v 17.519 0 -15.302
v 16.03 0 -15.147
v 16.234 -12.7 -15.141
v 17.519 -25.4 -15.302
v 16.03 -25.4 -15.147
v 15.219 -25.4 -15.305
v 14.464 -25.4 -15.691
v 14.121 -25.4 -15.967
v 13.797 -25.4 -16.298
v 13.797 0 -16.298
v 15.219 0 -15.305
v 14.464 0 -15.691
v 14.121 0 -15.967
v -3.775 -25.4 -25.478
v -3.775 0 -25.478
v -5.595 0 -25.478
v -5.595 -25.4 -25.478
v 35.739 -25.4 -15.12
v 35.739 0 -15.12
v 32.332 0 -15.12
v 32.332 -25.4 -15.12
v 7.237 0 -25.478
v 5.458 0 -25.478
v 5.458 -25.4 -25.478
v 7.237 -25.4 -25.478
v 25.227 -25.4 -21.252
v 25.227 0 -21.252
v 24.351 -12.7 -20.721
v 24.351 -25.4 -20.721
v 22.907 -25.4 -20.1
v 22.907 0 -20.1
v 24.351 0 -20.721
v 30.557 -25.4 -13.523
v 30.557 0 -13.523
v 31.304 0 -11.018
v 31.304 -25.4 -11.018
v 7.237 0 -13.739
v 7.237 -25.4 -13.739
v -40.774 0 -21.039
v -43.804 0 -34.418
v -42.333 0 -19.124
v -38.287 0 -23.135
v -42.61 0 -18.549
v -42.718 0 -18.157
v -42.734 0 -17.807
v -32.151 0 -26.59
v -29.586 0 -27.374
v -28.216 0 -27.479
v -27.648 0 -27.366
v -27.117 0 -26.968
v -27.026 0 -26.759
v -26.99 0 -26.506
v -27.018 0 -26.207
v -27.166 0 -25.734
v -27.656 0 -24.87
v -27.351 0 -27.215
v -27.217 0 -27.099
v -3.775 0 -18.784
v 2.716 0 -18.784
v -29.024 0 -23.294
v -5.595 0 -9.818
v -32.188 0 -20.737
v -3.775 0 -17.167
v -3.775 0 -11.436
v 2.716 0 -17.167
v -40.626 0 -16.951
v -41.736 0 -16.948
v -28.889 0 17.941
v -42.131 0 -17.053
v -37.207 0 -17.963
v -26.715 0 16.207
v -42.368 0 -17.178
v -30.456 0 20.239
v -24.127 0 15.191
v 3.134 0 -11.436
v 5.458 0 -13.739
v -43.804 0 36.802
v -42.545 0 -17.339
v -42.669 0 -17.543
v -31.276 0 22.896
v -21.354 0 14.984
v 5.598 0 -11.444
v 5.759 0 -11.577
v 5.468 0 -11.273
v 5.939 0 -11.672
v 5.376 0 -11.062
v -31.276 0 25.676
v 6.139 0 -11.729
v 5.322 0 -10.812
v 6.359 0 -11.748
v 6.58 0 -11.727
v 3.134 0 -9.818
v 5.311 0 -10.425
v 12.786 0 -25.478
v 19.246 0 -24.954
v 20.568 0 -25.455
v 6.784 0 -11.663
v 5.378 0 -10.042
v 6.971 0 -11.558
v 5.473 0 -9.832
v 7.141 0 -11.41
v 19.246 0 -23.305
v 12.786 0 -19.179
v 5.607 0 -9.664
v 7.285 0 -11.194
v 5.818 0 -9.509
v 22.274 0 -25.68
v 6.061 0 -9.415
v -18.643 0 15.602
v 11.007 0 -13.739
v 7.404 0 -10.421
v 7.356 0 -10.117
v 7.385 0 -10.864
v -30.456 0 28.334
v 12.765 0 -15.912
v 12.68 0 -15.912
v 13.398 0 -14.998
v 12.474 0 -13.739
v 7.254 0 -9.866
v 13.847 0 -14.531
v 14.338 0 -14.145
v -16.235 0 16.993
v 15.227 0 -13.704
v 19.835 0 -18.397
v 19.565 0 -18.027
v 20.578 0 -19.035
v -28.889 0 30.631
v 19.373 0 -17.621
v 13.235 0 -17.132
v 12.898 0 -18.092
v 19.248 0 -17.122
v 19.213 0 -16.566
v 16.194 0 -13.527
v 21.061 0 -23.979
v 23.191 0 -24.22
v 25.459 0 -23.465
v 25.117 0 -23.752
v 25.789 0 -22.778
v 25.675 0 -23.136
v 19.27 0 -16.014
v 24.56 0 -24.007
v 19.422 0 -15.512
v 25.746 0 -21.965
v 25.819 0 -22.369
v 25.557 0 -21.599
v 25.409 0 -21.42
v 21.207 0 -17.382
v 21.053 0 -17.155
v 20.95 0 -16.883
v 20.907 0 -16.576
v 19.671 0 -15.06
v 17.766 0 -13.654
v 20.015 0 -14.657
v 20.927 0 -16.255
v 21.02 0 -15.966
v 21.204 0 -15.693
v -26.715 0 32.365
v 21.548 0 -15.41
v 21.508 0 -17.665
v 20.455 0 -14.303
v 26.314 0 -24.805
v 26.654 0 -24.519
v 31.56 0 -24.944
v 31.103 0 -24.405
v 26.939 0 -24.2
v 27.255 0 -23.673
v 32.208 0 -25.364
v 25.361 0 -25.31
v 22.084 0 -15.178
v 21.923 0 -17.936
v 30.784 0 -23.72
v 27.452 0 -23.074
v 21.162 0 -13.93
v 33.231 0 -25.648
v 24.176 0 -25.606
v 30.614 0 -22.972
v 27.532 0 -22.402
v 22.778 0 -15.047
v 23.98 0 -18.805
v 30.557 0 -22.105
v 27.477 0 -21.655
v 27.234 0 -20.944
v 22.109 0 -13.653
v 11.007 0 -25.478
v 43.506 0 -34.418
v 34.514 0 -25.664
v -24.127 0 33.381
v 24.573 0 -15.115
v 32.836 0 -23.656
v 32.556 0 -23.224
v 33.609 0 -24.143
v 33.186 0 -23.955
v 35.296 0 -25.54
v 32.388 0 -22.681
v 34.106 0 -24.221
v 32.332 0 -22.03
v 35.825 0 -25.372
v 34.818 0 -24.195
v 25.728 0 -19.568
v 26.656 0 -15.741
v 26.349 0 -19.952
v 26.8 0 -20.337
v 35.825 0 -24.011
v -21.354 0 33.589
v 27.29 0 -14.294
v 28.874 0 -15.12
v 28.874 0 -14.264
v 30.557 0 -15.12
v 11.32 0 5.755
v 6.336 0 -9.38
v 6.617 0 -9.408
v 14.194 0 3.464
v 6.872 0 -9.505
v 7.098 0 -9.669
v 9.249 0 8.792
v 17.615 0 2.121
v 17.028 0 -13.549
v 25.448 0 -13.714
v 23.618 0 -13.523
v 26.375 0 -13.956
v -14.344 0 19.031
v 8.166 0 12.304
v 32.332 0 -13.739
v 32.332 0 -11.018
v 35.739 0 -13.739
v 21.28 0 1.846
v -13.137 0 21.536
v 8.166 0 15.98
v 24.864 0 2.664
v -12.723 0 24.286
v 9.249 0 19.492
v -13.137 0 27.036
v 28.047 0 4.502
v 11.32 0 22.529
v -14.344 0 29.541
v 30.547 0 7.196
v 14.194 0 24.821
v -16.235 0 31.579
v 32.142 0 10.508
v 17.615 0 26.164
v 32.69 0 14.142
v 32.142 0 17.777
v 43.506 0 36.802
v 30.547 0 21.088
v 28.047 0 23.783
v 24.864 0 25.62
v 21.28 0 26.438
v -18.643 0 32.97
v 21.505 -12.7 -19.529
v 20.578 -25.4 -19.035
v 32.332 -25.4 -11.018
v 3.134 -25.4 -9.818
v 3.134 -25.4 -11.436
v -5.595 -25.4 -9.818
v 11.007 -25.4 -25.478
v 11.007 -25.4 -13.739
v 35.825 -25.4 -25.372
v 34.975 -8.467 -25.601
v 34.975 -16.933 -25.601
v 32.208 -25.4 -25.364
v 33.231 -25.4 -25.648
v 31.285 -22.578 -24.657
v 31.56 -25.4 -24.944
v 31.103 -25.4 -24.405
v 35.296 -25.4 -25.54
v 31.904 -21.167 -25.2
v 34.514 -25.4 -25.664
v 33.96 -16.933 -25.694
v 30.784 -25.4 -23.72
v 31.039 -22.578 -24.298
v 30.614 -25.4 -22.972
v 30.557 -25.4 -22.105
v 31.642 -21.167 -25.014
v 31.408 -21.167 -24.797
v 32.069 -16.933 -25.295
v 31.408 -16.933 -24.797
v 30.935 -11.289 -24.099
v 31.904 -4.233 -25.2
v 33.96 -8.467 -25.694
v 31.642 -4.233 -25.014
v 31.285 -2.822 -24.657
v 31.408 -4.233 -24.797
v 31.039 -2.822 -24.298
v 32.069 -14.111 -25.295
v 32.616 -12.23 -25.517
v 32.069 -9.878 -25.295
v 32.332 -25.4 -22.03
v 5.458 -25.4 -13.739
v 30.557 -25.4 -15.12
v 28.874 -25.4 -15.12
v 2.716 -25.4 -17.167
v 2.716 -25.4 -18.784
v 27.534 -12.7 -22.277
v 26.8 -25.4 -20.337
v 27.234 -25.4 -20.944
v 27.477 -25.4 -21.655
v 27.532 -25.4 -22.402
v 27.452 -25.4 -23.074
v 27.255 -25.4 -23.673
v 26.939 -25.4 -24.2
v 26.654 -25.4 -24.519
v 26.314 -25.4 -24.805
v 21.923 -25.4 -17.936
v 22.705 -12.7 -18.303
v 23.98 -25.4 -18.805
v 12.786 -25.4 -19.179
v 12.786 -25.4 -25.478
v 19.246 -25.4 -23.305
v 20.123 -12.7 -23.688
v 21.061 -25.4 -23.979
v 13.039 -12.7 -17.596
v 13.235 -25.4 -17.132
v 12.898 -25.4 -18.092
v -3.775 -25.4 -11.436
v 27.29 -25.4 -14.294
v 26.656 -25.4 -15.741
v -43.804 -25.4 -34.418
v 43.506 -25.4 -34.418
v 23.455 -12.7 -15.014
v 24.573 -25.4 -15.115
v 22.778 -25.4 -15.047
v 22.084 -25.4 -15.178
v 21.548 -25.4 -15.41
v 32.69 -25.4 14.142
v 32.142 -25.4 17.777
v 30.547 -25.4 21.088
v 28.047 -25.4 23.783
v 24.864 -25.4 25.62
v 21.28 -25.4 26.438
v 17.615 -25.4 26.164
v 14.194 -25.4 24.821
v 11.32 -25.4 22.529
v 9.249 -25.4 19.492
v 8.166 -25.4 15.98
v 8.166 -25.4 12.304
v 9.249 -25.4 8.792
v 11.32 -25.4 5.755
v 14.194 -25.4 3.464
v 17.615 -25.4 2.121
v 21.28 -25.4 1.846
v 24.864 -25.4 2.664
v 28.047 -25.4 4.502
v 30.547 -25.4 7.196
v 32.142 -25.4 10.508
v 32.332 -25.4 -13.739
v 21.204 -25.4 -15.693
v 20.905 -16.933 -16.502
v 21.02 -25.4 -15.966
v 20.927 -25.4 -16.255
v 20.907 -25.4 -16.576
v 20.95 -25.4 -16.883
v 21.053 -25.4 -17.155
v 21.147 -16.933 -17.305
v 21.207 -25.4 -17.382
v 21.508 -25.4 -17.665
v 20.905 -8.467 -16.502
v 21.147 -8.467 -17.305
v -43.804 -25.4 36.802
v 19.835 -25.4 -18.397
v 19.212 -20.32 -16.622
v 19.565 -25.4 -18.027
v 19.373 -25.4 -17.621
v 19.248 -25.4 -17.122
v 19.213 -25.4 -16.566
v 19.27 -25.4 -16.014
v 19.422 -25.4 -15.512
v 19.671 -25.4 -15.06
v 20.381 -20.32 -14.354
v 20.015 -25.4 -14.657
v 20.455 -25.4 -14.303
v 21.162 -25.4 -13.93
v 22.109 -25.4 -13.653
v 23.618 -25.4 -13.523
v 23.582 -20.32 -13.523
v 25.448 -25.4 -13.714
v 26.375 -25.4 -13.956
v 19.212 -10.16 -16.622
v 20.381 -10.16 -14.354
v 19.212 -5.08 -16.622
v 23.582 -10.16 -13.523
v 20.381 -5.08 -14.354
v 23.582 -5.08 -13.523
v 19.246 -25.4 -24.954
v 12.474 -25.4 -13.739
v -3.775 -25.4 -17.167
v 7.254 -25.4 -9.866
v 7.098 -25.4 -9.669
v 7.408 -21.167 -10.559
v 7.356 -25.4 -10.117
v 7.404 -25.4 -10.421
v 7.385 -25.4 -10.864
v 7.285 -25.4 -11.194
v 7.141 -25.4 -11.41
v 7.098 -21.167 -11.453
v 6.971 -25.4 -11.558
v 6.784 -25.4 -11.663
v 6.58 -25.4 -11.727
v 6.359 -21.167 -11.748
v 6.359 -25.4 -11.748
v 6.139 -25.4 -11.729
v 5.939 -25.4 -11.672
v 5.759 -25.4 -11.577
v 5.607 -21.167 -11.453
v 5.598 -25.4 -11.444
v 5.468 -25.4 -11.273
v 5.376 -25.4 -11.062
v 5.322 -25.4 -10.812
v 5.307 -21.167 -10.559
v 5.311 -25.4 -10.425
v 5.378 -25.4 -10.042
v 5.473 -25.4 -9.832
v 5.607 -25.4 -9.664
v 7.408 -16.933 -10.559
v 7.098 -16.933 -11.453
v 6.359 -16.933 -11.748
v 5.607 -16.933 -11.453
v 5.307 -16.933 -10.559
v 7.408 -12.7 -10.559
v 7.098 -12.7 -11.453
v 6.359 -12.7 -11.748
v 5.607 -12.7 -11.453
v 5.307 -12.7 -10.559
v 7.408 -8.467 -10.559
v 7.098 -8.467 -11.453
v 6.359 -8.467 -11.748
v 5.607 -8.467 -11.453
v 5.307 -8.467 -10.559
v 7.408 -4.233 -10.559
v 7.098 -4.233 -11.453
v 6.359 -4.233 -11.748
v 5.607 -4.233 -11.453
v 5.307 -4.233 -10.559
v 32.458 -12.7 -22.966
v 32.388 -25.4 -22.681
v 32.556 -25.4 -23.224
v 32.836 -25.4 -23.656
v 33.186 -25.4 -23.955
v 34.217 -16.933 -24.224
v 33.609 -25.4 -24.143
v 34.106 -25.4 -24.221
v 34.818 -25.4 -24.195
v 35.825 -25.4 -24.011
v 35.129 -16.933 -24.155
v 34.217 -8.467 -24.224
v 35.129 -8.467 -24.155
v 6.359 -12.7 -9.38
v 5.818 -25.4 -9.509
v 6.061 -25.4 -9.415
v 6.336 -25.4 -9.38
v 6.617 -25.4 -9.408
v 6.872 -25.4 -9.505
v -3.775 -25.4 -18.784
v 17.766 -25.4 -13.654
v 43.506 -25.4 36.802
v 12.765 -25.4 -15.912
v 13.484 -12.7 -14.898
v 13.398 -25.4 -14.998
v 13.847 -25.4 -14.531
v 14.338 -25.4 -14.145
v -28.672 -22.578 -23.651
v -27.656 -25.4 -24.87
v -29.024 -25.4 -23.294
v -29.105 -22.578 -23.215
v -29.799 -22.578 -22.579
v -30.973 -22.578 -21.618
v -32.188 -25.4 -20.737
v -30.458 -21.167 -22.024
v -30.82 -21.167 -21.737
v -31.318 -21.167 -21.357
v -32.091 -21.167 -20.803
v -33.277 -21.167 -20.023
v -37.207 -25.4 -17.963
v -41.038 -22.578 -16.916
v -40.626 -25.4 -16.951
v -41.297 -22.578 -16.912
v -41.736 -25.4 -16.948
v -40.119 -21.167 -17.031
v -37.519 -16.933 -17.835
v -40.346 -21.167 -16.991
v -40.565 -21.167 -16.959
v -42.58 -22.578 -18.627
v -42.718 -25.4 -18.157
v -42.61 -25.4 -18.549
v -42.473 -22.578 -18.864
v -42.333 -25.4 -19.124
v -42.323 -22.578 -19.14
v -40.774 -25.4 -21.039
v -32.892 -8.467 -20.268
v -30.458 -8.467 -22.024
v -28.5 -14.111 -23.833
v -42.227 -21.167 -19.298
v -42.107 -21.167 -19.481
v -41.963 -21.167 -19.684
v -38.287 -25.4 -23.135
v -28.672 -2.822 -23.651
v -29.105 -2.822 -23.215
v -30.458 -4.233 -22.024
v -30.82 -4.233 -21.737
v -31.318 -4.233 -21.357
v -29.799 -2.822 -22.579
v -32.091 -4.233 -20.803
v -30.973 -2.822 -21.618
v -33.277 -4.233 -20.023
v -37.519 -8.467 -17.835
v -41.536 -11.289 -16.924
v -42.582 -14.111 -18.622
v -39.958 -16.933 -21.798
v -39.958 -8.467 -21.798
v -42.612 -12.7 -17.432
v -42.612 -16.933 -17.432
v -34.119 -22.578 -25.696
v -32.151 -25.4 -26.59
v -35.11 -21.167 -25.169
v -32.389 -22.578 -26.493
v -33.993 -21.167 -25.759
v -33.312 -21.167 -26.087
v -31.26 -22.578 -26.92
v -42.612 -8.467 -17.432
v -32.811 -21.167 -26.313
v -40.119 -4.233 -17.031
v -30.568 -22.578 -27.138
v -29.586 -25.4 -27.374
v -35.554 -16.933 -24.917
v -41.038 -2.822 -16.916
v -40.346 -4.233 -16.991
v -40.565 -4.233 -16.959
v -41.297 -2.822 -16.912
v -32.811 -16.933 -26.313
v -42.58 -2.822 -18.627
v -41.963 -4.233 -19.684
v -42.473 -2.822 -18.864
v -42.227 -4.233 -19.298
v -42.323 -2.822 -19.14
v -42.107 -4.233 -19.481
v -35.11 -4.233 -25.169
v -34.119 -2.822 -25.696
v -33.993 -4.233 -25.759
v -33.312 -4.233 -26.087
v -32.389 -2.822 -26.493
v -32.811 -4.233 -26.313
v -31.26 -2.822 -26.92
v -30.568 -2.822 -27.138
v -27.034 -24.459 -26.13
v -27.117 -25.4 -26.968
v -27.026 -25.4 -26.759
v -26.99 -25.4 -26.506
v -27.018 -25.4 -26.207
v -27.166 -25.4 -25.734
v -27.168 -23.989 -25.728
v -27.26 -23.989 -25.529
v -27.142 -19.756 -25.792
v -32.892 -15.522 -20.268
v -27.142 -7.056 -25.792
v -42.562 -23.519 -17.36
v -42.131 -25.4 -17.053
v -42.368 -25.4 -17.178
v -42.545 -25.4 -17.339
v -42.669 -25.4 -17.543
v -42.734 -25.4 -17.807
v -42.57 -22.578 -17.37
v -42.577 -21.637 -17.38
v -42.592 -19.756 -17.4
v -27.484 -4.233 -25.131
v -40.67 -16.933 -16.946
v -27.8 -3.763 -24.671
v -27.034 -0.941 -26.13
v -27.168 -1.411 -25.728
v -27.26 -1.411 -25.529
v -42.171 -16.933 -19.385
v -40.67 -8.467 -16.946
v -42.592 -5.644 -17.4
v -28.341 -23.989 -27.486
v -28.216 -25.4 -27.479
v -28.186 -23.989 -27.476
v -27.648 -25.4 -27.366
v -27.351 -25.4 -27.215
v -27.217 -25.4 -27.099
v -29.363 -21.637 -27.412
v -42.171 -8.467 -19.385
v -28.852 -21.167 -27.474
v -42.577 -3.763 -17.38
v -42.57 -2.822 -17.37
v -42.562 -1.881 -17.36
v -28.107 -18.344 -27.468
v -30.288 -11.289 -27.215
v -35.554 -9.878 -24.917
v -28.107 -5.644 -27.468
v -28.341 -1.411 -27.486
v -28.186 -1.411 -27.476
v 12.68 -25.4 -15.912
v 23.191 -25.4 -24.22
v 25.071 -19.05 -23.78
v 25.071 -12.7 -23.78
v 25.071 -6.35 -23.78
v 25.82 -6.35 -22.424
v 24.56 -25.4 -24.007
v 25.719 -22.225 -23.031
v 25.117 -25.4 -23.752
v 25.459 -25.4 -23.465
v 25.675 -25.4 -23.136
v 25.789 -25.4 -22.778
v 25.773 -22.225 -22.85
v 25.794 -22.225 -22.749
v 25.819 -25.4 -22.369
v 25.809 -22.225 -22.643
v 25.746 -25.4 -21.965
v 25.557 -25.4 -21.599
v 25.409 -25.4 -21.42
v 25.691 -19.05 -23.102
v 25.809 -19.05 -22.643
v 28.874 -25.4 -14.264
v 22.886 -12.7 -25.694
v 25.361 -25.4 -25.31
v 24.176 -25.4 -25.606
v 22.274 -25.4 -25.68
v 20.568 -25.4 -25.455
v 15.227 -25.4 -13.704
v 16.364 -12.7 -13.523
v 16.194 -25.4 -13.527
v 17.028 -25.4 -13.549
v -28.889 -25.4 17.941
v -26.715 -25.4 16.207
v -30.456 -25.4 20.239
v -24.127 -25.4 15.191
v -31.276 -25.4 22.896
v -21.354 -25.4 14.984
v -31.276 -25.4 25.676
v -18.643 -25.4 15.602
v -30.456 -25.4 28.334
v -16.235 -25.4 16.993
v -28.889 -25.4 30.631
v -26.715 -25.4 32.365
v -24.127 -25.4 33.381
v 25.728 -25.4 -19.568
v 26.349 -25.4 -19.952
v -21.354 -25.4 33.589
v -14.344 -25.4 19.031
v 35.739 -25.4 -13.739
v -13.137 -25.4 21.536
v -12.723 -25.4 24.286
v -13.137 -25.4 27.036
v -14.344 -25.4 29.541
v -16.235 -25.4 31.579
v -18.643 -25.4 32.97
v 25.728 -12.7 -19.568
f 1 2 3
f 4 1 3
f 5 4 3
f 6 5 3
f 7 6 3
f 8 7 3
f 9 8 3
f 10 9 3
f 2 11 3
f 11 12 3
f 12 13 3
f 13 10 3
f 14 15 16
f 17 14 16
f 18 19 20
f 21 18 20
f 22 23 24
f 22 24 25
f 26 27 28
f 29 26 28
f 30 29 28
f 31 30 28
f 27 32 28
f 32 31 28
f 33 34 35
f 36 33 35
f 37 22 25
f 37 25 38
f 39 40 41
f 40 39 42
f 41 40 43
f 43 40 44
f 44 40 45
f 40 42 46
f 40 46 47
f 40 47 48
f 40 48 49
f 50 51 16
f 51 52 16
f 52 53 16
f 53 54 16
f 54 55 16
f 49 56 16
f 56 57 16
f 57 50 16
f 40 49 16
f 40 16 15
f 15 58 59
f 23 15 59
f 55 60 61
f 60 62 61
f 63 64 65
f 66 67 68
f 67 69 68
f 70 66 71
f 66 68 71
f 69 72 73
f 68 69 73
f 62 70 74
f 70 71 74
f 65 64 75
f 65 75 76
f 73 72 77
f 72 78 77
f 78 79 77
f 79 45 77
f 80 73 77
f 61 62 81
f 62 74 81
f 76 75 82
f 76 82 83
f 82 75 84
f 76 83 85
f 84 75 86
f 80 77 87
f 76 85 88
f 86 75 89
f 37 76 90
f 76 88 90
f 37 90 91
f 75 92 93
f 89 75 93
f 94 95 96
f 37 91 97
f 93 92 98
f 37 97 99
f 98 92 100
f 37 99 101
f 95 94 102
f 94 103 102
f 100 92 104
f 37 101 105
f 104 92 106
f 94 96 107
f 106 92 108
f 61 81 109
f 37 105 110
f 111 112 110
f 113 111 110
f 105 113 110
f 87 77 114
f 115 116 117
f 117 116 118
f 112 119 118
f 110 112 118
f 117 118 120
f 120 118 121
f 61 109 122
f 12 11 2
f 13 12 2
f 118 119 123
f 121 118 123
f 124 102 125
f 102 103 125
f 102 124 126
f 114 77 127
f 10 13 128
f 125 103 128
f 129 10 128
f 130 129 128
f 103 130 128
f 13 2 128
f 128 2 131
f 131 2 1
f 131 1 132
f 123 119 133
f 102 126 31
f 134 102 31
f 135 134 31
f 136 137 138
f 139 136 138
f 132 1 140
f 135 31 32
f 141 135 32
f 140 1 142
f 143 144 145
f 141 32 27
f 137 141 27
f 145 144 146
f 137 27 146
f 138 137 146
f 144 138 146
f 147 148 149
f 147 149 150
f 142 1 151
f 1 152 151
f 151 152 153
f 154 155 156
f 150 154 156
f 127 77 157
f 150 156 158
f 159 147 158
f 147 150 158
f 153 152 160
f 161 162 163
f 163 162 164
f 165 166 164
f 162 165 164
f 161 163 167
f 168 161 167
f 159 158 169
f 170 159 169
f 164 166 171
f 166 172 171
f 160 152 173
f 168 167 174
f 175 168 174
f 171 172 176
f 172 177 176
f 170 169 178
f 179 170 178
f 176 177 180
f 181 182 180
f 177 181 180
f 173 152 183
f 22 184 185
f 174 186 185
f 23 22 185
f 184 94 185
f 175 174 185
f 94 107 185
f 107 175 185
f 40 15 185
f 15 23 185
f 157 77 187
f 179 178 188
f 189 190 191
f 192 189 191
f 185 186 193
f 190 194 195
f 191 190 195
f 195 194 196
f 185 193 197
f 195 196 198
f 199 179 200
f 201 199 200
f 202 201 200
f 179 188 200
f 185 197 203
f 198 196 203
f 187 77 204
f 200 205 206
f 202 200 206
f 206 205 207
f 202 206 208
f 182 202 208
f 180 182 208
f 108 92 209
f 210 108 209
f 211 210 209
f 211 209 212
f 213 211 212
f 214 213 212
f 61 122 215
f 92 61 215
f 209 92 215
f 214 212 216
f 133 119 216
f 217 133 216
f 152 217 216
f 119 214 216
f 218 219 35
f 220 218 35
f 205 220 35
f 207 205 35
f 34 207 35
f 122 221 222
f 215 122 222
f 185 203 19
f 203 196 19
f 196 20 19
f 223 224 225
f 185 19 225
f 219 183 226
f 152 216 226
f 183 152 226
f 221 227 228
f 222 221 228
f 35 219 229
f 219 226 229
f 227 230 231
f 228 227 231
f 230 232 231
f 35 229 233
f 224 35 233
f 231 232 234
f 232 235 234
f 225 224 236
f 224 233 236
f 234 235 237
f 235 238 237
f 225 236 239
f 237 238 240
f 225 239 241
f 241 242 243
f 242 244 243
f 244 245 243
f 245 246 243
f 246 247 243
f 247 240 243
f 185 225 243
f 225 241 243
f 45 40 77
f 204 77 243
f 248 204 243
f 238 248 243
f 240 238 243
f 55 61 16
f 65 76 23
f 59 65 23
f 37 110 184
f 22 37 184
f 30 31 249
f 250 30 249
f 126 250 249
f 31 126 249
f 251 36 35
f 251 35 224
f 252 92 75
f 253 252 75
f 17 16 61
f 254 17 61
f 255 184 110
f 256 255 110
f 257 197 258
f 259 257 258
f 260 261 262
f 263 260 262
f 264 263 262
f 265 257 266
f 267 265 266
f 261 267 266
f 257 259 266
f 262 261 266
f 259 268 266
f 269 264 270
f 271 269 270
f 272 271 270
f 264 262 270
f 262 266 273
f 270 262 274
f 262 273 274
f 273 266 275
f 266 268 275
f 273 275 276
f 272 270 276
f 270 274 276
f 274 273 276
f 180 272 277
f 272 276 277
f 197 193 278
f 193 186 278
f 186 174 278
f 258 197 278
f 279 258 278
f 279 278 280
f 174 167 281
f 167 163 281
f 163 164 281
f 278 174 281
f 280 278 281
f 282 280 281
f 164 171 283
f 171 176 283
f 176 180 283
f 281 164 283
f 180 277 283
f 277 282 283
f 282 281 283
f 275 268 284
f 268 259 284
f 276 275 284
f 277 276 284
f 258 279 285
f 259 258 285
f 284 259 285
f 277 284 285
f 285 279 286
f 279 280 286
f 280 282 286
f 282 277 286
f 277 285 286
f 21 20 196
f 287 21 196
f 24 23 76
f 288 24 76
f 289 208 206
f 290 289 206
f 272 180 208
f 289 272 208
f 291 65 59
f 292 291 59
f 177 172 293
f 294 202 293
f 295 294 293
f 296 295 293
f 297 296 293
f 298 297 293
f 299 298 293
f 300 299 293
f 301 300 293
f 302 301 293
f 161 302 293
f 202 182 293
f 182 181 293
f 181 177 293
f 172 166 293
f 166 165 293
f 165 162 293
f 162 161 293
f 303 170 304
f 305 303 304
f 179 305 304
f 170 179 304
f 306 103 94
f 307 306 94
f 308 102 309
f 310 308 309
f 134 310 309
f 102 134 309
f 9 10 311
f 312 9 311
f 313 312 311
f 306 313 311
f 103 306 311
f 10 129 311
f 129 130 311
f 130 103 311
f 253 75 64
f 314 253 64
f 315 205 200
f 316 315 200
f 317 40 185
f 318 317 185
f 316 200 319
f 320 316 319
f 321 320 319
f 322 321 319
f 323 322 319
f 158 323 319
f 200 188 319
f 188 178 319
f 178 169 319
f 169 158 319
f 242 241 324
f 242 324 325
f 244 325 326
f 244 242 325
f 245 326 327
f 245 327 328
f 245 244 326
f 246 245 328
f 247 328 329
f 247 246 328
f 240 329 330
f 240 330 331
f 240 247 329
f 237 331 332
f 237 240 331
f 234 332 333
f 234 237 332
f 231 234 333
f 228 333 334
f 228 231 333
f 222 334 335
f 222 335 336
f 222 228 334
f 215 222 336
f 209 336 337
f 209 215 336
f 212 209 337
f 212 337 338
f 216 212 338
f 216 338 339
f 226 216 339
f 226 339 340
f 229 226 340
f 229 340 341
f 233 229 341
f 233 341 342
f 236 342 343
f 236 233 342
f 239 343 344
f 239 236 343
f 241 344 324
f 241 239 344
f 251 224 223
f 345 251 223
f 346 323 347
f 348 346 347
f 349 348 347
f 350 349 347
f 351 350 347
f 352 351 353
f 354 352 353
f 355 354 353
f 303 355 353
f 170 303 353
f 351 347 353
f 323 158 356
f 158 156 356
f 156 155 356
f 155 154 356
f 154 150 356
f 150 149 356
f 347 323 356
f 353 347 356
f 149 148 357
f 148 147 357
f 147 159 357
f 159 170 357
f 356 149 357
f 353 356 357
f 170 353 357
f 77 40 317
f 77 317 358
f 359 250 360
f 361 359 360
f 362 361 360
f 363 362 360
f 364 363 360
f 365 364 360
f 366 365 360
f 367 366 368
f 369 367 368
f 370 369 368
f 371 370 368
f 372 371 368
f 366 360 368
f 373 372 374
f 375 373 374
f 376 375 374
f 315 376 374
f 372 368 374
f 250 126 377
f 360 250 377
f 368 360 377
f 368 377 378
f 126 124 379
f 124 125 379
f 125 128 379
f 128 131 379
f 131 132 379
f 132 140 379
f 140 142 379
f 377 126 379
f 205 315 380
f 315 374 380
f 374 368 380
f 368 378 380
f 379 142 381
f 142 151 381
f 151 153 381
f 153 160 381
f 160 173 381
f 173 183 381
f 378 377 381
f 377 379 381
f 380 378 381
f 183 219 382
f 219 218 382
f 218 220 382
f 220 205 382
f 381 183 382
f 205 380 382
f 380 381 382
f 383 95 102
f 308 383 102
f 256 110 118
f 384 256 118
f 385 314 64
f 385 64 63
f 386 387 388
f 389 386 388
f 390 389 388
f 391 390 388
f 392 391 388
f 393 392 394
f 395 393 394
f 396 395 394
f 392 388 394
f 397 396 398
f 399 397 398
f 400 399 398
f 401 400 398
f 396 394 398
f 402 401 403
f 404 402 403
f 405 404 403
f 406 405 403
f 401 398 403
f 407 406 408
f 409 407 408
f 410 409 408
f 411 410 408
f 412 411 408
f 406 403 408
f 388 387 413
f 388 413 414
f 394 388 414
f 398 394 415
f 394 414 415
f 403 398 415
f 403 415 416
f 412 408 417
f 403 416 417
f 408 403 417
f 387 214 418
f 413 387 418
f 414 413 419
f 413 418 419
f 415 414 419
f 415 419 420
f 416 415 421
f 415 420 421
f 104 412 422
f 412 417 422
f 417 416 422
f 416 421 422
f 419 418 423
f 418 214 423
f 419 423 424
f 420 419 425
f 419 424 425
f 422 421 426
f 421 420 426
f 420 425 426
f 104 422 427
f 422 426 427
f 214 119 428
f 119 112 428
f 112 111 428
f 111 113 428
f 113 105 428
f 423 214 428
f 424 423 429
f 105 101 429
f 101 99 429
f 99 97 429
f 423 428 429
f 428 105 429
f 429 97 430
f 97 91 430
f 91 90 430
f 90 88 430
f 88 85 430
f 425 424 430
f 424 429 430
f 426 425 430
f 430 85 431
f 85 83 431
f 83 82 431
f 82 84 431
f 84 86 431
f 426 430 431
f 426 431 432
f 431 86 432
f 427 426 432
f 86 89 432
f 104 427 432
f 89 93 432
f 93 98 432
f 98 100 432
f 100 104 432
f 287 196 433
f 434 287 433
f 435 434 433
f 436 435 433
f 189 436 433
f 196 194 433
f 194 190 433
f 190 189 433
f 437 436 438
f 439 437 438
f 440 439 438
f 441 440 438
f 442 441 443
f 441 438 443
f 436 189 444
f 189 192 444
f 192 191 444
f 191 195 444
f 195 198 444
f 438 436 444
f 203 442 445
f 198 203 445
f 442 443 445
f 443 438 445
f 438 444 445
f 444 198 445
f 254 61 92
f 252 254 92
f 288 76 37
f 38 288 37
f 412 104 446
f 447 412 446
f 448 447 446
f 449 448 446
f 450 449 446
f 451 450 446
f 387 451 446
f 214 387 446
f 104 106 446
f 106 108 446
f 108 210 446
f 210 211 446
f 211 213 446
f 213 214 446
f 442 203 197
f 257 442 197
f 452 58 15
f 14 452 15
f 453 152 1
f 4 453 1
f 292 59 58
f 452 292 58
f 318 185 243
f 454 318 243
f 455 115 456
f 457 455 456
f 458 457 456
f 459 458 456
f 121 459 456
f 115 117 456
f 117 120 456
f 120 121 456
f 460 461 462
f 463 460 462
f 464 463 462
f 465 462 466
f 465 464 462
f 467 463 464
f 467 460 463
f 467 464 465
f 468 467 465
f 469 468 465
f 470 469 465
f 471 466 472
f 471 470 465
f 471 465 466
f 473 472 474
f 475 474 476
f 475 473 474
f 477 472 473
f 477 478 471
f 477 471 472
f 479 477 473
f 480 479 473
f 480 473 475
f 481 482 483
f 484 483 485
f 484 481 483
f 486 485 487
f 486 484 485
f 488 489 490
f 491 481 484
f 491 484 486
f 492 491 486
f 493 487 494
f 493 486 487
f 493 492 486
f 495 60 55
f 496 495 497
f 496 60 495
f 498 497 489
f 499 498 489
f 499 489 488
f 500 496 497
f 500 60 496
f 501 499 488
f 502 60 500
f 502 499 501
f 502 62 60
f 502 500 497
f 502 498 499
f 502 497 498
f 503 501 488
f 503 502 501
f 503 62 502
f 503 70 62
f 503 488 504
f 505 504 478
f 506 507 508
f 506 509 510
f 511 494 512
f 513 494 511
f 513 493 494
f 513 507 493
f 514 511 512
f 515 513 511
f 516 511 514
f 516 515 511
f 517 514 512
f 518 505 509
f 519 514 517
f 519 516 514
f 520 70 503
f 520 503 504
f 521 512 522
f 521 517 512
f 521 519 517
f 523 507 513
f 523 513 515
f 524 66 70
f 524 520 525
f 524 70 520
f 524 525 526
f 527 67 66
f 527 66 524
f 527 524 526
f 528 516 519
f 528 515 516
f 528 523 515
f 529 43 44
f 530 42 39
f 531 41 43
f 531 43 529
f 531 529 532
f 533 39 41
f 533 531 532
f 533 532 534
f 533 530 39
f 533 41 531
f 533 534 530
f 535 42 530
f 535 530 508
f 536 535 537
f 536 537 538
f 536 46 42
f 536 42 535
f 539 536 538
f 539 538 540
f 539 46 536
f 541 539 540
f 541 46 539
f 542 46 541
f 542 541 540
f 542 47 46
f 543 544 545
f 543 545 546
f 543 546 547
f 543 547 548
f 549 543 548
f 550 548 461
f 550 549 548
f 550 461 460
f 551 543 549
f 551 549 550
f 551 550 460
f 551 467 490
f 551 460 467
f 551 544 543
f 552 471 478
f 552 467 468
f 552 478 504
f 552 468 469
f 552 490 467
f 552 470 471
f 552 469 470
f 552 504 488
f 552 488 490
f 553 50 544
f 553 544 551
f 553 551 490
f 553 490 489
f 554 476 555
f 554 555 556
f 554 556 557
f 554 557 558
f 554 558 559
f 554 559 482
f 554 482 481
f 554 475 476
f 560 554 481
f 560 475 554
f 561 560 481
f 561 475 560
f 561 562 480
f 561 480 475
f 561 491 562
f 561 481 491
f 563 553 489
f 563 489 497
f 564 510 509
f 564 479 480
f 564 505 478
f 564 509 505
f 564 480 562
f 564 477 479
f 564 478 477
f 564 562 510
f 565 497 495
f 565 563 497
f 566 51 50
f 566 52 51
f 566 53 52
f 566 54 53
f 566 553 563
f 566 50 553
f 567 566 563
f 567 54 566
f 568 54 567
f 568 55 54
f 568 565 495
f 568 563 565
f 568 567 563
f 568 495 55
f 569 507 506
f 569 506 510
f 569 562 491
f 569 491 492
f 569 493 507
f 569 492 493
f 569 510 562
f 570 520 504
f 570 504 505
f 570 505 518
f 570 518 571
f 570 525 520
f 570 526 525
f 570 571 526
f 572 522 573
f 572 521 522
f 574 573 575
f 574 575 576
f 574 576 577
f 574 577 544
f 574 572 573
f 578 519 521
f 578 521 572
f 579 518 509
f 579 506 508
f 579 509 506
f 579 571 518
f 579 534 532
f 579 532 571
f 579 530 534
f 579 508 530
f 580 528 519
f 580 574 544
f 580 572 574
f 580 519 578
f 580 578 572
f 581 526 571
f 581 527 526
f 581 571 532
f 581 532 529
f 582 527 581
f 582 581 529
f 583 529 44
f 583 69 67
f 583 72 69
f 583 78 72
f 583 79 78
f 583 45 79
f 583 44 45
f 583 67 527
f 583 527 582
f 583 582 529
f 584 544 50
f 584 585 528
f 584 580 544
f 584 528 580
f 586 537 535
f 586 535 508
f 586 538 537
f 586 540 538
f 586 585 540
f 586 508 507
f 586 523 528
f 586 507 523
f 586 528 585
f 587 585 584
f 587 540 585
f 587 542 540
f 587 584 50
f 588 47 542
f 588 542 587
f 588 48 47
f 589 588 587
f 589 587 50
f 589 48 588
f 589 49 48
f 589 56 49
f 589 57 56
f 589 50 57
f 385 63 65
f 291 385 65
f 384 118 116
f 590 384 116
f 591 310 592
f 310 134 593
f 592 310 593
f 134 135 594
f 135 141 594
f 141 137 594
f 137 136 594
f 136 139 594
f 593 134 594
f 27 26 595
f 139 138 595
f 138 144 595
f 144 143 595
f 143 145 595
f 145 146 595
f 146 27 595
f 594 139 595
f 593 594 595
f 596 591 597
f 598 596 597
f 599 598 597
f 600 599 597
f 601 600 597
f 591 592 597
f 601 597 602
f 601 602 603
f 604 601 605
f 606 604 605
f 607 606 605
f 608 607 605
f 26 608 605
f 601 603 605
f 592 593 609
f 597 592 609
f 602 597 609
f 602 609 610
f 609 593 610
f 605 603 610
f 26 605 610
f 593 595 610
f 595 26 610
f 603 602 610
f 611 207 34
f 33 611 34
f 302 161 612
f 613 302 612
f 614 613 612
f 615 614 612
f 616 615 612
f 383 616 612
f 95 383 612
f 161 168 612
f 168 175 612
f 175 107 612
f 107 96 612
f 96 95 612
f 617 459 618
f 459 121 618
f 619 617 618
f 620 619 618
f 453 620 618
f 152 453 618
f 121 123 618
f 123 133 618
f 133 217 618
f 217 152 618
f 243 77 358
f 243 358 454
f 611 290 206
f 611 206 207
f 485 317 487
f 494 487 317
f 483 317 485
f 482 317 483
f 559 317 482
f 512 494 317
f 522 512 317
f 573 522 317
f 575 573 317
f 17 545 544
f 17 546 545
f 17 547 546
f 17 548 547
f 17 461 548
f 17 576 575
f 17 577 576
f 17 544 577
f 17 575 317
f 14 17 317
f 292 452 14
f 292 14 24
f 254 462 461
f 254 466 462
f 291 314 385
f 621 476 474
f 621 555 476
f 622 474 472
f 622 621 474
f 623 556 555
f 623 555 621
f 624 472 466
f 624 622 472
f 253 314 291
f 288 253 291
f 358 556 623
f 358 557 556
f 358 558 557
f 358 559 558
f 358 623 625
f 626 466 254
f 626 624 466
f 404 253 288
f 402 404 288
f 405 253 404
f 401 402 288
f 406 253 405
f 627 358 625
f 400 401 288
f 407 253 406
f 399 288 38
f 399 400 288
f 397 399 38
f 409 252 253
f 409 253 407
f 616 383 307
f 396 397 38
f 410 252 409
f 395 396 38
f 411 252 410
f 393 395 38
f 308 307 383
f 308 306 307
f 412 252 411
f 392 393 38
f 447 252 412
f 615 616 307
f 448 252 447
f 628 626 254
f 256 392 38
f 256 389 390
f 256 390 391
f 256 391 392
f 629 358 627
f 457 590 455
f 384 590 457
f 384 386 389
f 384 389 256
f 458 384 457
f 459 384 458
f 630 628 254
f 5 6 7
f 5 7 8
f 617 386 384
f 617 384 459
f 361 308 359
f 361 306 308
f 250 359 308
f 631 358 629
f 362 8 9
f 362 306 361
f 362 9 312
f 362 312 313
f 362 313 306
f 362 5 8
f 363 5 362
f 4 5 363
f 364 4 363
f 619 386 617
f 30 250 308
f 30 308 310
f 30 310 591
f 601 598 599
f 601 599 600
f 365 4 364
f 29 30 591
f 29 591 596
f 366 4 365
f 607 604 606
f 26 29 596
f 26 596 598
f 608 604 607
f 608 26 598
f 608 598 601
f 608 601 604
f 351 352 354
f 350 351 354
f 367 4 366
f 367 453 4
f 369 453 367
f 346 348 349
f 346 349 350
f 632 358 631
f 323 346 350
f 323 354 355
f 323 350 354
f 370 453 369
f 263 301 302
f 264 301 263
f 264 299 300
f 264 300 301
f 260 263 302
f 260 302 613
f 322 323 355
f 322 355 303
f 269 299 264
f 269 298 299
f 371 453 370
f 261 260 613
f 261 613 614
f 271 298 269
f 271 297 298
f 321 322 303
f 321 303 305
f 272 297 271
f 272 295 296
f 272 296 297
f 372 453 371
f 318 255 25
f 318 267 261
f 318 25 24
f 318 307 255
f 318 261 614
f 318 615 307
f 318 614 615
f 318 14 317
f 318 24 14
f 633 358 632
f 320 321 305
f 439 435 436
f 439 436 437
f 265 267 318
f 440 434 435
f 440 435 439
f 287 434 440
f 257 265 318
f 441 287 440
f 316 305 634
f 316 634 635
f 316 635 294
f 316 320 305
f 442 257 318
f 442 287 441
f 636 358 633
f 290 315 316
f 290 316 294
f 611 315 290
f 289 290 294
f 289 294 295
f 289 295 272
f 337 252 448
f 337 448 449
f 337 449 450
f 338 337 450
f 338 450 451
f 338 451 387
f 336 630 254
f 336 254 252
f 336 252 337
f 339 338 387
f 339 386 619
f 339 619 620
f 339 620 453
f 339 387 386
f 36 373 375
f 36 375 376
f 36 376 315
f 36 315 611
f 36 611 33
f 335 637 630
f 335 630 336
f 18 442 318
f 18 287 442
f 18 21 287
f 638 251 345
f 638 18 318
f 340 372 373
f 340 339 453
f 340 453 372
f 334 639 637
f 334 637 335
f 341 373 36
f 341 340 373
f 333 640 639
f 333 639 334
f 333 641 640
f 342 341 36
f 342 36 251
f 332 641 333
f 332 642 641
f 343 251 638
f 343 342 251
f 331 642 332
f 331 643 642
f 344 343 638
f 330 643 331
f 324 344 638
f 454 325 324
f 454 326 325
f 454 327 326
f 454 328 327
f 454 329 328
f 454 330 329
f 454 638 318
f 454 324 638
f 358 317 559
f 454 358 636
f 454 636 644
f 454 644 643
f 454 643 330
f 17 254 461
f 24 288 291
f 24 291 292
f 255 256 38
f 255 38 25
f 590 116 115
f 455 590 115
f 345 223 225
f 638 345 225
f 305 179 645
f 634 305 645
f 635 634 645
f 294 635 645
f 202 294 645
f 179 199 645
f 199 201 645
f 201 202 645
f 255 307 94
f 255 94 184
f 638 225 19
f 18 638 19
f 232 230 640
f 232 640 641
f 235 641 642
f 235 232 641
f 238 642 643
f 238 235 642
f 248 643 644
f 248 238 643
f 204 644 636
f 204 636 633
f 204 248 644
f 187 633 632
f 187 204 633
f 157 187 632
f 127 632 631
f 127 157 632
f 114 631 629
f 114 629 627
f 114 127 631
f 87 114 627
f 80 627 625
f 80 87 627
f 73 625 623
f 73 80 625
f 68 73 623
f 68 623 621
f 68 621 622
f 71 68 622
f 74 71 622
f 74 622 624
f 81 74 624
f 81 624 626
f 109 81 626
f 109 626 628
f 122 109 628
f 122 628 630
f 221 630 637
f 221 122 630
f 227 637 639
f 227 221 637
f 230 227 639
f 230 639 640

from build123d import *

# Parameters (mm, degrees)
F0_W     = 87.3107276857
F0_H     = 71.2193287909
F0_W_2   = 1.7788149683
F0_H_2   = 11.7388078353
F0_R     = 9.3285263882
F0_R_2   = 12.3305687845
F1_DEPTH = 25.4


with BuildPart() as f1:
    # F0 (on Front) → F1 (new body)
    with BuildSketch(Plane.XZ):
        with Locations((-0.1489948481, 1.1919569224)):
            Rectangle(F0_W, F0_H)
        with BuildLine():
            add(Edge.make_bspline(
                [(-27.116984129, -26.9679892808), (-24.67801378, -23.0046630593), (-37.5190635812, -17.8345930175), (-50.3601133823, -12.6645229757), (-39.9580339301, -21.797919239), (-29.5559544779, -30.9313155023), (-27.116984129, -26.9679892808)],
                knots=[0, 0, 0, 2.0943951024, 2.0943951024, 4.1887902048, 4.1887902048, 6.2831853072, 6.2831853072, 6.2831853072], degree=2, weights=[1, 0.5, 1, 0.5, 1, 0.5, 1]))
        make_face(mode=Mode.SUBTRACT)
        Polygon((-3.7753647961, -18.7843553795), (-3.7753647961, -25.4780463874), (-5.5953084342, -25.4780463874), (-5.5953084342, -9.8183053657), (3.1342517282, -9.8183053657), (3.1342517282, -11.436033044), (-3.7753647961, -11.436033044), (-3.7753647961, -17.1666277011), (2.716110252, -17.1666277011), (2.716110252, -18.7843553795), align=None, mode=Mode.SUBTRACT)
        with Locations((6.3474290554, -19.6086424698)):
            Rectangle(F0_W_2, F0_H_2, mode=Mode.SUBTRACT)
        with BuildLine():
            add(Edge.make_bspline(
                [(14.3383868563, -14.1453841663), (15.2603545373, -13.5233130358), (16.3639738433, -13.5233130358)],
                knots=[0, 0, 0, 1, 1, 1], degree=2))
            add(Edge.make_bspline(
                [(16.3639738433, -13.5233130358), (17.1454185693, -13.5233130358), (17.7657760052, -13.6535538234)],
                knots=[0, 0, 0, 1, 1, 1], degree=2))
            Line((17.7657760052, -13.6535538234), (17.5190039865, -15.3021280041))
            add(Edge.make_bspline(
                [(17.5190039865, -15.3021280041), (16.7923974869, -15.1410407141), (16.2337330556, -15.1410407141)],
                knots=[0, 0, 0, 1, 1, 1], degree=2))
            add(Edge.make_bspline(
                [(16.2337330556, -15.1410407141), (14.8079391697, -15.1410407141), (13.7968593707, -16.2977845519)],
                knots=[0, 0, 0, 1, 1, 1], degree=2))
            add(Edge.make_bspline(
                [(13.7968593707, -16.2977845519), (12.7857795718, -17.4545283897), (12.7857795718, -19.1785051316)],
                knots=[0, 0, 0, 1, 1, 1], degree=2))
            Line((12.7857795718, -19.1785051316), (12.7857795718, -25.4780463874))
            Line((12.7857795718, -25.4780463874), (11.0069646034, -25.4780463874))
            Line((11.0069646034, -25.4780463874), (11.0069646034, -13.7392385522))
            Line((11.0069646034, -13.7392385522), (12.4738871592, -13.7392385522))
            Line((12.4738871592, -13.7392385522), (12.6795305081, -15.9122032726))
            Line((12.6795305081, -15.9122032726), (12.7652152369, -15.9122032726))
            add(Edge.make_bspline(
                [(12.7652152369, -15.9122032726), (13.4164191752, -14.7674552969), (14.3383868563, -14.1453841663)],
                knots=[0, 0, 0, 1, 1, 1], degree=2))
        make_face(mode=Mode.SUBTRACT)
        with BuildLine():
            add(Edge.make_bspline(
                [(26.800373802, -20.336962664), (27.5338350798, -21.1081252225), (27.5338350798, -22.2768649223)],
                knots=[0, 0, 0, 1, 1, 1], degree=2))
            add(Edge.make_bspline(
                [(27.5338350798, -22.2768649223), (27.5338350798, -23.9151569355), (26.3136845428, -24.8045644197)],
                knots=[0, 0, 0, 1, 1, 1], degree=2))
            add(Edge.make_bspline(
                [(26.3136845428, -24.8045644197), (25.0935340058, -25.6939719038), (22.8862953938, -25.6939719038)],
                knots=[0, 0, 0, 1, 1, 1], degree=2))
            add(Edge.make_bspline(
                [(22.8862953938, -25.6939719038), (20.5522433834, -25.6939719038), (19.2464081176, -24.9536558476)],
                knots=[0, 0, 0, 1, 1, 1], degree=2))
            Line((19.2464081176, -24.9536558476), (19.2464081176, -23.305081667))
            add(Edge.make_bspline(
                [(19.2464081176, -23.305081667), (20.0929732374, -23.7335053106), (21.061210672, -23.9785636348)],
                knots=[0, 0, 0, 1, 1, 1], degree=2))
            add(Edge.make_bspline(
                [(21.061210672, -23.9785636348), (22.0294481066, -24.2236219589), (22.9308514528, -24.2236219589)],
                knots=[0, 0, 0, 1, 1, 1], degree=2))
            add(Edge.make_bspline(
                [(22.9308514528, -24.2236219589), (24.3223714472, -24.2236219589), (25.0712559763, -23.7797750641)],
                knots=[0, 0, 0, 1, 1, 1], degree=2))
            add(Edge.make_bspline(
                [(25.0712559763, -23.7797750641), (25.8201405054, -23.3359281693), (25.8201405054, -22.4242426557)],
                knots=[0, 0, 0, 1, 1, 1], degree=2))
            add(Edge.make_bspline(
                [(25.8201405054, -22.4242426557), (25.8201405054, -21.7387648259), (25.2272021826, -21.2520755667)],
                knots=[0, 0, 0, 1, 1, 1], degree=2))
            add(Edge.make_bspline(
                [(25.2272021826, -21.2520755667), (24.6342638598, -20.7653863076), (22.9068597287, -20.1004728127)],
                knots=[0, 0, 0, 1, 1, 1], degree=2))
            add(Edge.make_bspline(
                [(22.9068597287, -20.1004728127), (21.2685677155, -19.4903975442), (20.577948802, -19.0345547873)],
                knots=[0, 0, 0, 1, 1, 1], degree=2))
            add(Edge.make_bspline(
                [(20.577948802, -19.0345547873), (19.8873298885, -18.5787120305), (19.5497320573, -18.0011969589)],
                knots=[0, 0, 0, 1, 1, 1], degree=2))
            add(Edge.make_bspline(
                [(19.5497320573, -18.0011969589), (19.2121342261, -17.4236818873), (19.2121342261, -16.6216728265)],
                knots=[0, 0, 0, 1, 1, 1], degree=2))
            add(Edge.make_bspline(
                [(19.2121342261, -16.6216728265), (19.2121342261, -15.185596773), (20.3808739259, -14.3544549044)],
                knots=[0, 0, 0, 1, 1, 1], degree=2))
            add(Edge.make_bspline(
                [(20.3808739259, -14.3544549044), (21.5496136257, -13.5233130358), (23.5820553911, -13.5233130358)],
                knots=[0, 0, 0, 1, 1, 1], degree=2))
            add(Edge.make_bspline(
                [(23.5820553911, -13.5233130358), (25.4774015905, -13.5233130358), (27.2904904503, -14.2944755943)],
                knots=[0, 0, 0, 1, 1, 1], degree=2))
            Line((27.2904904503, -14.2944755943), (26.6564234577, -15.7408338152))
            add(Edge.make_bspline(
                [(26.6564234577, -15.7408338152), (24.891318046, -15.0142273156), (23.4552419926, -15.0142273156)],
                knots=[0, 0, 0, 1, 1, 1], degree=2))
            add(Edge.make_bspline(
                [(23.4552419926, -15.0142273156), (22.1905353966, -15.0142273156), (21.5478999311, -15.4100907623)],
                knots=[0, 0, 0, 1, 1, 1], degree=2))
            add(Edge.make_bspline(
                [(21.5478999311, -15.4100907623), (20.9052644657, -15.805954209), (20.9052644657, -16.5017142062)],
                knots=[0, 0, 0, 1, 1, 1], degree=2))
            add(Edge.make_bspline(
                [(20.9052644657, -16.5017142062), (20.9052644657, -16.9746939088), (21.1468954007, -17.3054369617)],
                knots=[0, 0, 0, 1, 1, 1], degree=2))
            add(Edge.make_bspline(
                [(21.1468954007, -17.3054369617), (21.3885263357, -17.6361800146), (21.923199043, -17.9360765651)],
                knots=[0, 0, 0, 1, 1, 1], degree=2))
            add(Edge.make_bspline(
                [(21.923199043, -17.9360765651), (22.4578717502, -18.2359731156), (23.9796325323, -18.8049197144)],
                knots=[0, 0, 0, 1, 1, 1], degree=2))
            add(Edge.make_bspline(
                [(23.9796325323, -18.8049197144), (26.0669125241, -19.5658001054), (26.800373802, -20.336962664)],
                knots=[0, 0, 0, 1, 1, 1], degree=2))
        make_face(mode=Mode.SUBTRACT)
        with BuildLine():
            add(Edge.make_bspline(
                [(32.8360060933, -23.6563890547), (33.3398322982, -24.2236219589), (34.2172439204, -24.2236219589)],
                knots=[0, 0, 0, 1, 1, 1], degree=2))
            add(Edge.make_bspline(
                [(34.2172439204, -24.2236219589), (34.6902236229, -24.2236219589), (35.128929434, -24.1550741759)],
                knots=[0, 0, 0, 1, 1, 1], degree=2))
            add(Edge.make_bspline(
                [(35.128929434, -24.1550741759), (35.5676352451, -24.0865263929), (35.8246894312, -24.0111238317)],
                knots=[0, 0, 0, 1, 1, 1], degree=2))
            Line((35.8246894312, -24.0111238317), (35.8246894312, -25.3717973238))
            add(Edge.make_bspline(
                [(35.8246894312, -25.3717973238), (35.5367887427, -25.5088928898), (34.9746969223, -25.6014323968)],
                knots=[0, 0, 0, 1, 1, 1], degree=2))
            add(Edge.make_bspline(
                [(34.9746969223, -25.6014323968), (34.4126051019, -25.6939719038), (33.9601897342, -25.6939719038)],
                knots=[0, 0, 0, 1, 1, 1], degree=2))
            add(Edge.make_bspline(
                [(33.9601897342, -25.6939719038), (30.5567923092, -25.6939719038), (30.5567923092, -22.1054954648)],
                knots=[0, 0, 0, 1, 1, 1], degree=2))
            Line((30.5567923092, -22.1054954648), (30.5567923092, -15.1204763792))
            Line((30.5567923092, -15.1204763792), (28.8739442371, -15.1204763792))
            Line((28.8739442371, -15.1204763792), (28.8739442371, -14.263629092))
            Line((28.8739442371, -14.263629092), (30.5567923092, -13.5233130358))
            Line((30.5567923092, -13.5233130358), (31.3039631437, -11.0178915679))
            Line((31.3039631437, -11.0178915679), (32.3321798884, -11.0178915679))
            Line((32.3321798884, -11.0178915679), (32.3321798884, -13.7392385522))
            Line((32.3321798884, -13.7392385522), (35.7390047025, -13.7392385522))
            Line((35.7390047025, -13.7392385522), (35.7390047025, -15.1204763792))
            Line((35.7390047025, -15.1204763792), (32.3321798884, -15.1204763792))
            Line((32.3321798884, -15.1204763792), (32.3321798884, -22.0300929036))
            add(Edge.make_bspline(
                [(32.3321798884, -22.0300929036), (32.3321798884, -23.0891561506), (32.8360060933, -23.6563890547)],
                knots=[0, 0, 0, 1, 1, 1], degree=2))
        make_face(mode=Mode.SUBTRACT)
        with BuildLine():
            add(Edge.make_bspline(
                [(5.6071129992, -11.4531699898), (5.3072164487, -11.158414523), (5.3072164487, -10.5586214219)],
                knots=[0, 0, 0, 1, 1, 1], degree=2))
            add(Edge.make_bspline(
                [(5.3072164487, -10.5586214219), (5.3072164487, -9.9485461534), (5.6071129992, -9.664072854)],
                knots=[0, 0, 0, 1, 1, 1], degree=2))
            add(Edge.make_bspline(
                [(5.6071129992, -9.664072854), (5.9070095497, -9.3795995547), (6.3594249174, -9.3795995547)],
                knots=[0, 0, 0, 1, 1, 1], degree=2))
            add(Edge.make_bspline(
                [(6.3594249174, -9.3795995547), (6.787848561, -9.3795995547), (7.098027279, -9.6692139377)],
                knots=[0, 0, 0, 1, 1, 1], degree=2))
            add(Edge.make_bspline(
                [(7.098027279, -9.6692139377), (7.408205997, -9.9588283208), (7.408205997, -10.5586214219)],
                knots=[0, 0, 0, 1, 1, 1], degree=2))
            add(Edge.make_bspline(
                [(7.408205997, -10.5586214219), (7.408205997, -11.158414523), (7.098027279, -11.4531699898)],
                knots=[0, 0, 0, 1, 1, 1], degree=2))
            add(Edge.make_bspline(
                [(7.098027279, -11.4531699898), (6.787848561, -11.7479254566), (6.3594249174, -11.7479254566)],
                knots=[0, 0, 0, 1, 1, 1], degree=2))
            add(Edge.make_bspline(
                [(6.3594249174, -11.7479254566), (5.9070095497, -11.7479254566), (5.6071129992, -11.4531699898)],
                knots=[0, 0, 0, 1, 1, 1], degree=2))
        make_face(mode=Mode.SUBTRACT)
        with Locations((-22.0511741936, 24.286089465)):
            Circle(F0_R, mode=Mode.SUBTRACT)
        with Locations((20.3589446885, 14.1421683438)):
            Circle(F0_R_2, mode=Mode.SUBTRACT)
    extrude(amount=F1_DEPTH)


solid = f1.part
